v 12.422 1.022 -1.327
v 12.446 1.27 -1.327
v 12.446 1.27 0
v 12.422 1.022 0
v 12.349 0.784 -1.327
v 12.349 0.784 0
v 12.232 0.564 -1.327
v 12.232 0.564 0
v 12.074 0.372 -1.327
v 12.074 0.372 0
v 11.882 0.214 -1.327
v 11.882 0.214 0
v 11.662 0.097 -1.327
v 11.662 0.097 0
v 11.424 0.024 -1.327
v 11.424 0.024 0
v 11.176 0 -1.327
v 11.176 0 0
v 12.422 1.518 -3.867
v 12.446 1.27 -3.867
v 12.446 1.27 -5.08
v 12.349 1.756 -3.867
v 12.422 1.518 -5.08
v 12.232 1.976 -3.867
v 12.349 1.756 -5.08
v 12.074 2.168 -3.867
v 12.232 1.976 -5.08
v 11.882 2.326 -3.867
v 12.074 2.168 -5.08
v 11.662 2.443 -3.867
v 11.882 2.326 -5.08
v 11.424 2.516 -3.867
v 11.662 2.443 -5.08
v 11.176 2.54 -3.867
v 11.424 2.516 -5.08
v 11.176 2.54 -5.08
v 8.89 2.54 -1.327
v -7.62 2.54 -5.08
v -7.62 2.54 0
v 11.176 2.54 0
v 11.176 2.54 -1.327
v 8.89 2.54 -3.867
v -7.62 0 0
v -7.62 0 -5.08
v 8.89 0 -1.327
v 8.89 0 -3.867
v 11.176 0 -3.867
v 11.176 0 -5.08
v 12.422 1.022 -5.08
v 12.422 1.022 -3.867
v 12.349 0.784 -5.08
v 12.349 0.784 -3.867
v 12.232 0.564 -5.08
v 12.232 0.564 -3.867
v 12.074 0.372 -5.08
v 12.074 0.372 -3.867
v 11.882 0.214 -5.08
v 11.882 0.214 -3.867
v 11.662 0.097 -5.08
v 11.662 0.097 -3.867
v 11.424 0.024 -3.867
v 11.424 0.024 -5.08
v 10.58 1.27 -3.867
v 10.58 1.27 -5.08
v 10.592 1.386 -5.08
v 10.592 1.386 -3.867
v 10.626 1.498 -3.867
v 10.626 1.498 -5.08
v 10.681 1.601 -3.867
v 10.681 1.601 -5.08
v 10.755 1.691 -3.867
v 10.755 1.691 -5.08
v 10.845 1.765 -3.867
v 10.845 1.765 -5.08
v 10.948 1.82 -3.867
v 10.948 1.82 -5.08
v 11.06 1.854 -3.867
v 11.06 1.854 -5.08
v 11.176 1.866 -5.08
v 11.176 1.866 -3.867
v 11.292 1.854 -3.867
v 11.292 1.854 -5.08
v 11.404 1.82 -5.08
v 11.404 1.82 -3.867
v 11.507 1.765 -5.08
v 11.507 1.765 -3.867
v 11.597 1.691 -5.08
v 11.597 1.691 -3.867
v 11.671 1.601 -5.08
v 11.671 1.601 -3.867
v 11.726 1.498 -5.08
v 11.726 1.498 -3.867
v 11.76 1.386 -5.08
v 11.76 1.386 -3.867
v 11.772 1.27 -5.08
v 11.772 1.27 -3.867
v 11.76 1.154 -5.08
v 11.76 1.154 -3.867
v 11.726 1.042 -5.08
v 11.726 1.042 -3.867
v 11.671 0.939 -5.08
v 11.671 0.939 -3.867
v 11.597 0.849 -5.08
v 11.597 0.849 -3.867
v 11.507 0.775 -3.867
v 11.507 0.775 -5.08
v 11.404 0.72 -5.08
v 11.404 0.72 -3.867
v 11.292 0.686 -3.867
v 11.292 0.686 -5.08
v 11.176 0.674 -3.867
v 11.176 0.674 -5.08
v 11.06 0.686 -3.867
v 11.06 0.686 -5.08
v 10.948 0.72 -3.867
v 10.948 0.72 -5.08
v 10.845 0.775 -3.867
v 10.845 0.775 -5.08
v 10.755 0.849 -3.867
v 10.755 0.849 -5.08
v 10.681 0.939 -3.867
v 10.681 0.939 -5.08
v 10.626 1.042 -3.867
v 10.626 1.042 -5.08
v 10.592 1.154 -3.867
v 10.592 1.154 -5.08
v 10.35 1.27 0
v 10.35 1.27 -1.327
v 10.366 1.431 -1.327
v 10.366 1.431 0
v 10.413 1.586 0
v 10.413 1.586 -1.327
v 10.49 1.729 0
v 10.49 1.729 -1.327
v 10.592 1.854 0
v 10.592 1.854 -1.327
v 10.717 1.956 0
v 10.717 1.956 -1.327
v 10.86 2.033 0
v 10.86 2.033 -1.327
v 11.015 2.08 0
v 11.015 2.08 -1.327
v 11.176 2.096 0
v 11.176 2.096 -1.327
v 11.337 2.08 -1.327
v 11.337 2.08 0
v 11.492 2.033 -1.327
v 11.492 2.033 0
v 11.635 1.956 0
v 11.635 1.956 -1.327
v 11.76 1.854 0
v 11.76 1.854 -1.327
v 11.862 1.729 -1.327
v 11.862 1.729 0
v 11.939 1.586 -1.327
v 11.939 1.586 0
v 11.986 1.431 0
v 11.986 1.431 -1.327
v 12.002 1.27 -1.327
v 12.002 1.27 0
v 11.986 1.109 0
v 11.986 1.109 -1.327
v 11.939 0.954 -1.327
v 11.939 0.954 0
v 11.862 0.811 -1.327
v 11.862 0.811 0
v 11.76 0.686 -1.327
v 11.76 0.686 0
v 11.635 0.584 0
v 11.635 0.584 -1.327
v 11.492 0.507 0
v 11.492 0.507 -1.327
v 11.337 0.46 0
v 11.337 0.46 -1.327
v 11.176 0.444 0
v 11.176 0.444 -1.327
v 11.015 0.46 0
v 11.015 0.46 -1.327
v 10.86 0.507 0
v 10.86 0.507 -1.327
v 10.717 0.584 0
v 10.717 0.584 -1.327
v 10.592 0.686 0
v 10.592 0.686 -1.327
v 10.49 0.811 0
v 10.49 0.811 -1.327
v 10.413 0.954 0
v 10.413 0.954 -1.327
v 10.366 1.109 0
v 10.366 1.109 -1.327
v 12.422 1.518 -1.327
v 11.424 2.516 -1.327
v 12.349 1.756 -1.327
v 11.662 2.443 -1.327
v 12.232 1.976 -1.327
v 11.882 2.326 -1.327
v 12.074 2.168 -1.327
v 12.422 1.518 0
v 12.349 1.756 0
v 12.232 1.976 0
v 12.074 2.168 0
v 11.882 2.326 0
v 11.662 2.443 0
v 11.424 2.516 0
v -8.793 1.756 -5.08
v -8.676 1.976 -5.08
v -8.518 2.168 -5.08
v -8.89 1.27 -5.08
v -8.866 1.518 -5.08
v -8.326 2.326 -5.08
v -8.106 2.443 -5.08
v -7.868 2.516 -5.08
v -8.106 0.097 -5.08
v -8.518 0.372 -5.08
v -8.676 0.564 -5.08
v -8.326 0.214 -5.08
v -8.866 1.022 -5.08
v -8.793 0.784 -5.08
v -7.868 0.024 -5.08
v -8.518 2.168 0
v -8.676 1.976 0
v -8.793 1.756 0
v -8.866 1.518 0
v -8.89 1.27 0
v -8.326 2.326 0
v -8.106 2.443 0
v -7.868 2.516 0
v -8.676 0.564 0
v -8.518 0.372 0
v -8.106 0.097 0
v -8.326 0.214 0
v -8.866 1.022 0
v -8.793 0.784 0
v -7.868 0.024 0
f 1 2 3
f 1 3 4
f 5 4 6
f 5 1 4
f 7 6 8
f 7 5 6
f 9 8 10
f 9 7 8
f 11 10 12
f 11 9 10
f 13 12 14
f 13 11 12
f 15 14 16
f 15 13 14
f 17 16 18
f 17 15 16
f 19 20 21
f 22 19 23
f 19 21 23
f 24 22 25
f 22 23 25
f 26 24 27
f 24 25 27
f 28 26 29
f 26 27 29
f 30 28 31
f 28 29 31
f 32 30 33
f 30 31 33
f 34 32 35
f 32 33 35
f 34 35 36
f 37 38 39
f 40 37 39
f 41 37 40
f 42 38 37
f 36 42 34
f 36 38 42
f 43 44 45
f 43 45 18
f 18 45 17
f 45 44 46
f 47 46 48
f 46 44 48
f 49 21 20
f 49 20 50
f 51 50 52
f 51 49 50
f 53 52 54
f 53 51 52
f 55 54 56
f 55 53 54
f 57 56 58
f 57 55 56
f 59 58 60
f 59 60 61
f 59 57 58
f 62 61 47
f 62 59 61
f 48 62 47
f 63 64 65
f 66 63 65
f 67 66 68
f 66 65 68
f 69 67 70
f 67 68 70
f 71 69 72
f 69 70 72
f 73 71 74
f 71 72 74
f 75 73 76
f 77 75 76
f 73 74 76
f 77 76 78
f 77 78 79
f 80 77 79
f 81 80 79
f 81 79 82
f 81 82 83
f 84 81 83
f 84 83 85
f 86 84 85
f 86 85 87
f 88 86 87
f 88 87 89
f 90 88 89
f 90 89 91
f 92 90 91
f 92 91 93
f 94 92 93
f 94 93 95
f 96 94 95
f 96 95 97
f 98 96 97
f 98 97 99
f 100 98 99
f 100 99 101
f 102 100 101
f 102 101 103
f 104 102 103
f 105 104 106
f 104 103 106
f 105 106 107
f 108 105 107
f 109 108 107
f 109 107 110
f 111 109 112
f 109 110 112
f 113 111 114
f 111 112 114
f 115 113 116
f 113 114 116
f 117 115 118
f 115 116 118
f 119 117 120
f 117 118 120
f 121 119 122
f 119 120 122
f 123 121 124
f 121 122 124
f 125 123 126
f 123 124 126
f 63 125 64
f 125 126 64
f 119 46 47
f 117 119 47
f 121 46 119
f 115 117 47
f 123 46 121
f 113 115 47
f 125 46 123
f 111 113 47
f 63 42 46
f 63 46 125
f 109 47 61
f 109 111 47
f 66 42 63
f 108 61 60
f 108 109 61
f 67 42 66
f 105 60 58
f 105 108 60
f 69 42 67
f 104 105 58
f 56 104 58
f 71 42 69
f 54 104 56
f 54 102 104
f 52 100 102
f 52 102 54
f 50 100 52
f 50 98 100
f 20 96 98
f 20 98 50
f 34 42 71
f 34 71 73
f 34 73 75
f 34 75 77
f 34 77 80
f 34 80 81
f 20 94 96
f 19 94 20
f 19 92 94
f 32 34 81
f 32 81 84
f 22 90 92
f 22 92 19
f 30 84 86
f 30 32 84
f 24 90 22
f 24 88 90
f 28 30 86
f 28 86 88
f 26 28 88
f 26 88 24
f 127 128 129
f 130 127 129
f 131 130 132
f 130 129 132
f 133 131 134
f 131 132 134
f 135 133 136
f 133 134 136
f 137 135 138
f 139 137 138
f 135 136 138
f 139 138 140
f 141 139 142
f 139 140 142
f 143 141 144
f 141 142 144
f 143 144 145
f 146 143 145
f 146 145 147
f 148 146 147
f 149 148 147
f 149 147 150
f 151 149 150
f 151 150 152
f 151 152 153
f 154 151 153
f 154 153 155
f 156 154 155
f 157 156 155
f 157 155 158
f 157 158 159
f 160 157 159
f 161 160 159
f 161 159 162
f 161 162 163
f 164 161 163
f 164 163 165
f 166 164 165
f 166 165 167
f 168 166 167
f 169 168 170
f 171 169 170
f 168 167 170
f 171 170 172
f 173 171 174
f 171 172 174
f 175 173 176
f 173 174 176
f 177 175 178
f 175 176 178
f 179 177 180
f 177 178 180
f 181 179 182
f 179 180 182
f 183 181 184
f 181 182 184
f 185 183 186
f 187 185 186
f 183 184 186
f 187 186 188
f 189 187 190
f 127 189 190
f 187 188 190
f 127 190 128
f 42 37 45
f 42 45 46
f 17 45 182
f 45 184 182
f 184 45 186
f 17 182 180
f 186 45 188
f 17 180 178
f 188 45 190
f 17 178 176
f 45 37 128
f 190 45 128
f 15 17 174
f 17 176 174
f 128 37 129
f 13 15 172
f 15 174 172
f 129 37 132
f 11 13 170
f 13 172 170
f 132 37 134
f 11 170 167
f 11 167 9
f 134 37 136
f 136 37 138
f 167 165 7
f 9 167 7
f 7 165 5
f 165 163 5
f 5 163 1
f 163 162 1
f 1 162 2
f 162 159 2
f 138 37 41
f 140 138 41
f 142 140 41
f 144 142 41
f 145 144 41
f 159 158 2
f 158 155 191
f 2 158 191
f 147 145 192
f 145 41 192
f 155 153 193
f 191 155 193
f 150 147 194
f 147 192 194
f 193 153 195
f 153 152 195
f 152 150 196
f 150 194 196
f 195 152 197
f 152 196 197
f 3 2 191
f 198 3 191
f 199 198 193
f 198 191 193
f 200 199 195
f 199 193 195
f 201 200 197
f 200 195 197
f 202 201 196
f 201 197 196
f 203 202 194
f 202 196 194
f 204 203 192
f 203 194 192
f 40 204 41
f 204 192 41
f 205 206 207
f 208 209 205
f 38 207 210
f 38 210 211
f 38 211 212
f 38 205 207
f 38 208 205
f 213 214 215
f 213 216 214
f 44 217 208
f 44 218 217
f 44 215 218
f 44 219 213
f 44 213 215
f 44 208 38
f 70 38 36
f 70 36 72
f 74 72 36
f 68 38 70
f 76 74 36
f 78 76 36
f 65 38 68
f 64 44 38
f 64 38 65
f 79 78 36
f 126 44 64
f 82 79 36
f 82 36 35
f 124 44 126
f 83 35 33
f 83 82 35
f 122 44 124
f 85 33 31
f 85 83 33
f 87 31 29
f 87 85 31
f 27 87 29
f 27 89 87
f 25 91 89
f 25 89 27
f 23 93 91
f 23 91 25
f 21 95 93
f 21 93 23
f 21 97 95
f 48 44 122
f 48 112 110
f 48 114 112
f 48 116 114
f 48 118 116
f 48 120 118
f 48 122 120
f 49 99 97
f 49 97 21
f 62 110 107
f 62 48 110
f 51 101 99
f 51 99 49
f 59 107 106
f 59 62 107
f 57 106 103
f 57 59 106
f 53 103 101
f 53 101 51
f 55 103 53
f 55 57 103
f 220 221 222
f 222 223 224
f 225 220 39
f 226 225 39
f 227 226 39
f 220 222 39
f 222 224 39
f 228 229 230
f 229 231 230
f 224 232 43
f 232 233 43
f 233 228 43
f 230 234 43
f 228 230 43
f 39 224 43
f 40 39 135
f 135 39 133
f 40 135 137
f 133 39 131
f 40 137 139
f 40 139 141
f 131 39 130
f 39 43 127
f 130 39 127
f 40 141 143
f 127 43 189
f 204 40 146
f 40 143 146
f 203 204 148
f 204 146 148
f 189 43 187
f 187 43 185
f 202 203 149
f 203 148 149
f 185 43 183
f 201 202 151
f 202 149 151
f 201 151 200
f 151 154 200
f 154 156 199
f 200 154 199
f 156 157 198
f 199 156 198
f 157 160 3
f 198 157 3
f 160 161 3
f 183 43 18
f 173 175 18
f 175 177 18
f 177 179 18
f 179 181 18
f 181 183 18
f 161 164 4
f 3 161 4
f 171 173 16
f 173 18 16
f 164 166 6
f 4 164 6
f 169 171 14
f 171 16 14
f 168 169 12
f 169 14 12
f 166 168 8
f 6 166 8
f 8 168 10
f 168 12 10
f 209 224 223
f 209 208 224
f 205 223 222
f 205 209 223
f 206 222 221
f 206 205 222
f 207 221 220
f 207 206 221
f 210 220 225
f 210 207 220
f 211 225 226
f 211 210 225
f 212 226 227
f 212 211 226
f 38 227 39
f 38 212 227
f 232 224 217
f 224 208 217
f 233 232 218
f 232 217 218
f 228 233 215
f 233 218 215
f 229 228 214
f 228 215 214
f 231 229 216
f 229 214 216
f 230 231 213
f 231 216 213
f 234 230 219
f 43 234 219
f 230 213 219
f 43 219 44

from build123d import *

# Parameters (mm, degrees)
SKETCH1_W                        = 21.336
SKETCH1_H                        = 5.08
BOSS_EXTRUDE1_DEPTH              = 2.54
FILLET1_R                        = 1.27
SKETCH8_W                        = 3.556
SKETCH8_H                        = 2.54
CUT_EXTRUDE1_DEPTH               = 2.54
F_97_0_0059_DIAMETER_HOLE1_D     = 1.651
F_97_0_0059_DIAMETER_HOLE1_DEPTH = 1.524
F_97_0_0059_DIAMETER_HOLE1_TIP   = 0.496010441
F_0_80_TAPPED_HOLE1_D            = 1.19126
F_0_80_TAPPED_HOLE1_DEPTH        = 4.064
F_0_80_TAPPED_HOLE1_TIP          = 0.357890611


with BuildPart() as part:
    # Sketch1 → Boss-Extrude1 (new body)
    with BuildSketch(Plane(origin=(0, 0, 0), x_dir=(1, 0, 0), z_dir=(0, 1, 0))):
        with Locations((1.778, 2.54)):
            Rectangle(SKETCH1_W, SKETCH1_H)
    extrude(amount=BOSS_EXTRUDE1_DEPTH)

    # Fillet1
    fillet1_edges = [part.edges().sort_by_distance(p)[0] for p in [
        (-8.89, 0, -2.54),
        (-8.89, 2.54, -2.54),
        (12.446, 0, -2.54),
        (12.446, 2.54, -2.54),
    ]]
    fillet(fillet1_edges, radius=FILLET1_R - 0.0001)  # a hair under: the kernel refuses the full size

    # Sketch8 → Cut-Extrude1 (cut)
    with BuildSketch(Plane(origin=(0, 2.54, 0), x_dir=(1, 0, 0), z_dir=(0, 1, 0))):
        with Locations((10.668, 2.596814381)):
            Rectangle(SKETCH8_W, SKETCH8_H)
    extrude(amount=-CUT_EXTRUDE1_DEPTH, mode=Mode.SUBTRACT)

    # #97 (0.0059) Diameter Hole1
    with Locations(Plane.XY):
        with Locations((11.176, 1.27)):
            Hole(F_97_0_0059_DIAMETER_HOLE1_D / 2, depth=F_97_0_0059_DIAMETER_HOLE1_DEPTH)
            with Locations((0, 0, -(F_97_0_0059_DIAMETER_HOLE1_DEPTH + F_97_0_0059_DIAMETER_HOLE1_TIP / 2))):  # 118° drill point
                Cone(0, F_97_0_0059_DIAMETER_HOLE1_D / 2, F_97_0_0059_DIAMETER_HOLE1_TIP, mode=Mode.SUBTRACT)

    # #0-80 Tapped Hole1
    with Locations(Plane.XY.offset(-3.866814381)):
        with Locations((11.176, 1.27)):
            Hole(F_0_80_TAPPED_HOLE1_D / 2, depth=F_0_80_TAPPED_HOLE1_DEPTH)
            with Locations((0, 0, -(F_0_80_TAPPED_HOLE1_DEPTH + F_0_80_TAPPED_HOLE1_TIP / 2))):  # 118° drill point
                Cone(0, F_0_80_TAPPED_HOLE1_D / 2, F_0_80_TAPPED_HOLE1_TIP, mode=Mode.SUBTRACT)


solid = part.part
